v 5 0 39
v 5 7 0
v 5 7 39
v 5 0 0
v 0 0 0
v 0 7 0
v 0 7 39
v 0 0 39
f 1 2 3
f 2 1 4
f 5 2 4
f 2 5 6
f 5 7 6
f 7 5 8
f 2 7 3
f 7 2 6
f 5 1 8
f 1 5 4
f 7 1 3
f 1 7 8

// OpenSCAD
translate([2.5, 3.5, 1.5]) color([0.6055458611860893, 0.15387883630139487, 0.7025980908137885]) cube([5, 7, 3], center=true);
translate([2.5, 3.5, 4.5]) color([0.928268212070889, 0.18538068806857422, 0.42170431041506296]) cube([5, 7, 3], center=true);
translate([2.5, 3.5, 7.5]) color([0.1747372019883816, 0.9595322940755414, 0.3403879026852894]) cube([5, 7, 3], center=true);
translate([2.5, 3.5, 10.5]) color([0.5233486454380116, 0.35536744790103547, 0.6315169232882821]) cube([5, 7, 3], center=true);
translate([2.5, 3.5, 13.5]) color([0.08649939658707362, 0.7550350740823142, 0.2947283238309857]) cube([5, 7, 3], center=true);
translate([2.5, 3.5, 16.5]) color([0.8301737658604361, 0.4490883769000732, 0.4620108455998946]) cube([5, 7, 3], center=true);
translate([2.5, 3.5, 19.5]) color([0.2187341846418389, 0.11445722556586746, 0.9788025142917065]) cube([5, 7, 3], center=true);
translate([2.5, 3.5, 22.5]) color([0.3011589686960586, 0.6091605287508749, 0.4242090709976407]) cube([5, 7, 3], center=true);
translate([2.5, 3.5, 25.5]) color([0.7513524999576429, 0.09255304692818778, 0.4976795968420046]) cube([5, 7, 3], center=true);
translate([2.5, 3.5, 28.5]) color([0.9609180855182016, 0.5437408220916614, 0.405305104554358]) cube([5, 7, 3], center=true);
translate([2.5, 3.5, 31.5]) color([0.6320656015278037, 0.0216193804206819, 0.2700784048715086]) cube([5, 7, 3], center=true);
translate([2.5, 1.0, 34.5]) color([0.6684886667173141, 0.0002532098932251925, 0.3984286079265319]) cube([5, 2, 3], center=true);
translate([2.5, 1.0, 37.5]) color([0.8905618085087551, 0.7099647178965433, 0.4445845492335537]) cube([5, 2, 3], center=true);
translate([2.5, 3.5, 34.0]) color([0.7465509493098265, 0.35382203223851694, 0.8712980207444939]) cube([5, 3, 2], center=true);
translate([2.5, 3.5, 36.0]) color([0.6725473918674463, 0.19603088941730495, 0.08525923665948931]) cube([5, 3, 2], center=true);
translate([2.5, 3.5, 38.0]) color([0.0704556688087915, 0.26248678792717994, 0.533638651221174]) cube([5, 3, 2], center=true);
translate([2.5, 6.0, 34.5]) color([0.11818482376773232, 0.8594532404023933, 0.8906989166138923]) cube([5, 2, 3], center=true);
translate([2.5, 6.0, 37.5]) color([0.7620005545284954, 0.06809296768032302, 0.8609410769469436]) cube([5, 2, 3], center=true);
